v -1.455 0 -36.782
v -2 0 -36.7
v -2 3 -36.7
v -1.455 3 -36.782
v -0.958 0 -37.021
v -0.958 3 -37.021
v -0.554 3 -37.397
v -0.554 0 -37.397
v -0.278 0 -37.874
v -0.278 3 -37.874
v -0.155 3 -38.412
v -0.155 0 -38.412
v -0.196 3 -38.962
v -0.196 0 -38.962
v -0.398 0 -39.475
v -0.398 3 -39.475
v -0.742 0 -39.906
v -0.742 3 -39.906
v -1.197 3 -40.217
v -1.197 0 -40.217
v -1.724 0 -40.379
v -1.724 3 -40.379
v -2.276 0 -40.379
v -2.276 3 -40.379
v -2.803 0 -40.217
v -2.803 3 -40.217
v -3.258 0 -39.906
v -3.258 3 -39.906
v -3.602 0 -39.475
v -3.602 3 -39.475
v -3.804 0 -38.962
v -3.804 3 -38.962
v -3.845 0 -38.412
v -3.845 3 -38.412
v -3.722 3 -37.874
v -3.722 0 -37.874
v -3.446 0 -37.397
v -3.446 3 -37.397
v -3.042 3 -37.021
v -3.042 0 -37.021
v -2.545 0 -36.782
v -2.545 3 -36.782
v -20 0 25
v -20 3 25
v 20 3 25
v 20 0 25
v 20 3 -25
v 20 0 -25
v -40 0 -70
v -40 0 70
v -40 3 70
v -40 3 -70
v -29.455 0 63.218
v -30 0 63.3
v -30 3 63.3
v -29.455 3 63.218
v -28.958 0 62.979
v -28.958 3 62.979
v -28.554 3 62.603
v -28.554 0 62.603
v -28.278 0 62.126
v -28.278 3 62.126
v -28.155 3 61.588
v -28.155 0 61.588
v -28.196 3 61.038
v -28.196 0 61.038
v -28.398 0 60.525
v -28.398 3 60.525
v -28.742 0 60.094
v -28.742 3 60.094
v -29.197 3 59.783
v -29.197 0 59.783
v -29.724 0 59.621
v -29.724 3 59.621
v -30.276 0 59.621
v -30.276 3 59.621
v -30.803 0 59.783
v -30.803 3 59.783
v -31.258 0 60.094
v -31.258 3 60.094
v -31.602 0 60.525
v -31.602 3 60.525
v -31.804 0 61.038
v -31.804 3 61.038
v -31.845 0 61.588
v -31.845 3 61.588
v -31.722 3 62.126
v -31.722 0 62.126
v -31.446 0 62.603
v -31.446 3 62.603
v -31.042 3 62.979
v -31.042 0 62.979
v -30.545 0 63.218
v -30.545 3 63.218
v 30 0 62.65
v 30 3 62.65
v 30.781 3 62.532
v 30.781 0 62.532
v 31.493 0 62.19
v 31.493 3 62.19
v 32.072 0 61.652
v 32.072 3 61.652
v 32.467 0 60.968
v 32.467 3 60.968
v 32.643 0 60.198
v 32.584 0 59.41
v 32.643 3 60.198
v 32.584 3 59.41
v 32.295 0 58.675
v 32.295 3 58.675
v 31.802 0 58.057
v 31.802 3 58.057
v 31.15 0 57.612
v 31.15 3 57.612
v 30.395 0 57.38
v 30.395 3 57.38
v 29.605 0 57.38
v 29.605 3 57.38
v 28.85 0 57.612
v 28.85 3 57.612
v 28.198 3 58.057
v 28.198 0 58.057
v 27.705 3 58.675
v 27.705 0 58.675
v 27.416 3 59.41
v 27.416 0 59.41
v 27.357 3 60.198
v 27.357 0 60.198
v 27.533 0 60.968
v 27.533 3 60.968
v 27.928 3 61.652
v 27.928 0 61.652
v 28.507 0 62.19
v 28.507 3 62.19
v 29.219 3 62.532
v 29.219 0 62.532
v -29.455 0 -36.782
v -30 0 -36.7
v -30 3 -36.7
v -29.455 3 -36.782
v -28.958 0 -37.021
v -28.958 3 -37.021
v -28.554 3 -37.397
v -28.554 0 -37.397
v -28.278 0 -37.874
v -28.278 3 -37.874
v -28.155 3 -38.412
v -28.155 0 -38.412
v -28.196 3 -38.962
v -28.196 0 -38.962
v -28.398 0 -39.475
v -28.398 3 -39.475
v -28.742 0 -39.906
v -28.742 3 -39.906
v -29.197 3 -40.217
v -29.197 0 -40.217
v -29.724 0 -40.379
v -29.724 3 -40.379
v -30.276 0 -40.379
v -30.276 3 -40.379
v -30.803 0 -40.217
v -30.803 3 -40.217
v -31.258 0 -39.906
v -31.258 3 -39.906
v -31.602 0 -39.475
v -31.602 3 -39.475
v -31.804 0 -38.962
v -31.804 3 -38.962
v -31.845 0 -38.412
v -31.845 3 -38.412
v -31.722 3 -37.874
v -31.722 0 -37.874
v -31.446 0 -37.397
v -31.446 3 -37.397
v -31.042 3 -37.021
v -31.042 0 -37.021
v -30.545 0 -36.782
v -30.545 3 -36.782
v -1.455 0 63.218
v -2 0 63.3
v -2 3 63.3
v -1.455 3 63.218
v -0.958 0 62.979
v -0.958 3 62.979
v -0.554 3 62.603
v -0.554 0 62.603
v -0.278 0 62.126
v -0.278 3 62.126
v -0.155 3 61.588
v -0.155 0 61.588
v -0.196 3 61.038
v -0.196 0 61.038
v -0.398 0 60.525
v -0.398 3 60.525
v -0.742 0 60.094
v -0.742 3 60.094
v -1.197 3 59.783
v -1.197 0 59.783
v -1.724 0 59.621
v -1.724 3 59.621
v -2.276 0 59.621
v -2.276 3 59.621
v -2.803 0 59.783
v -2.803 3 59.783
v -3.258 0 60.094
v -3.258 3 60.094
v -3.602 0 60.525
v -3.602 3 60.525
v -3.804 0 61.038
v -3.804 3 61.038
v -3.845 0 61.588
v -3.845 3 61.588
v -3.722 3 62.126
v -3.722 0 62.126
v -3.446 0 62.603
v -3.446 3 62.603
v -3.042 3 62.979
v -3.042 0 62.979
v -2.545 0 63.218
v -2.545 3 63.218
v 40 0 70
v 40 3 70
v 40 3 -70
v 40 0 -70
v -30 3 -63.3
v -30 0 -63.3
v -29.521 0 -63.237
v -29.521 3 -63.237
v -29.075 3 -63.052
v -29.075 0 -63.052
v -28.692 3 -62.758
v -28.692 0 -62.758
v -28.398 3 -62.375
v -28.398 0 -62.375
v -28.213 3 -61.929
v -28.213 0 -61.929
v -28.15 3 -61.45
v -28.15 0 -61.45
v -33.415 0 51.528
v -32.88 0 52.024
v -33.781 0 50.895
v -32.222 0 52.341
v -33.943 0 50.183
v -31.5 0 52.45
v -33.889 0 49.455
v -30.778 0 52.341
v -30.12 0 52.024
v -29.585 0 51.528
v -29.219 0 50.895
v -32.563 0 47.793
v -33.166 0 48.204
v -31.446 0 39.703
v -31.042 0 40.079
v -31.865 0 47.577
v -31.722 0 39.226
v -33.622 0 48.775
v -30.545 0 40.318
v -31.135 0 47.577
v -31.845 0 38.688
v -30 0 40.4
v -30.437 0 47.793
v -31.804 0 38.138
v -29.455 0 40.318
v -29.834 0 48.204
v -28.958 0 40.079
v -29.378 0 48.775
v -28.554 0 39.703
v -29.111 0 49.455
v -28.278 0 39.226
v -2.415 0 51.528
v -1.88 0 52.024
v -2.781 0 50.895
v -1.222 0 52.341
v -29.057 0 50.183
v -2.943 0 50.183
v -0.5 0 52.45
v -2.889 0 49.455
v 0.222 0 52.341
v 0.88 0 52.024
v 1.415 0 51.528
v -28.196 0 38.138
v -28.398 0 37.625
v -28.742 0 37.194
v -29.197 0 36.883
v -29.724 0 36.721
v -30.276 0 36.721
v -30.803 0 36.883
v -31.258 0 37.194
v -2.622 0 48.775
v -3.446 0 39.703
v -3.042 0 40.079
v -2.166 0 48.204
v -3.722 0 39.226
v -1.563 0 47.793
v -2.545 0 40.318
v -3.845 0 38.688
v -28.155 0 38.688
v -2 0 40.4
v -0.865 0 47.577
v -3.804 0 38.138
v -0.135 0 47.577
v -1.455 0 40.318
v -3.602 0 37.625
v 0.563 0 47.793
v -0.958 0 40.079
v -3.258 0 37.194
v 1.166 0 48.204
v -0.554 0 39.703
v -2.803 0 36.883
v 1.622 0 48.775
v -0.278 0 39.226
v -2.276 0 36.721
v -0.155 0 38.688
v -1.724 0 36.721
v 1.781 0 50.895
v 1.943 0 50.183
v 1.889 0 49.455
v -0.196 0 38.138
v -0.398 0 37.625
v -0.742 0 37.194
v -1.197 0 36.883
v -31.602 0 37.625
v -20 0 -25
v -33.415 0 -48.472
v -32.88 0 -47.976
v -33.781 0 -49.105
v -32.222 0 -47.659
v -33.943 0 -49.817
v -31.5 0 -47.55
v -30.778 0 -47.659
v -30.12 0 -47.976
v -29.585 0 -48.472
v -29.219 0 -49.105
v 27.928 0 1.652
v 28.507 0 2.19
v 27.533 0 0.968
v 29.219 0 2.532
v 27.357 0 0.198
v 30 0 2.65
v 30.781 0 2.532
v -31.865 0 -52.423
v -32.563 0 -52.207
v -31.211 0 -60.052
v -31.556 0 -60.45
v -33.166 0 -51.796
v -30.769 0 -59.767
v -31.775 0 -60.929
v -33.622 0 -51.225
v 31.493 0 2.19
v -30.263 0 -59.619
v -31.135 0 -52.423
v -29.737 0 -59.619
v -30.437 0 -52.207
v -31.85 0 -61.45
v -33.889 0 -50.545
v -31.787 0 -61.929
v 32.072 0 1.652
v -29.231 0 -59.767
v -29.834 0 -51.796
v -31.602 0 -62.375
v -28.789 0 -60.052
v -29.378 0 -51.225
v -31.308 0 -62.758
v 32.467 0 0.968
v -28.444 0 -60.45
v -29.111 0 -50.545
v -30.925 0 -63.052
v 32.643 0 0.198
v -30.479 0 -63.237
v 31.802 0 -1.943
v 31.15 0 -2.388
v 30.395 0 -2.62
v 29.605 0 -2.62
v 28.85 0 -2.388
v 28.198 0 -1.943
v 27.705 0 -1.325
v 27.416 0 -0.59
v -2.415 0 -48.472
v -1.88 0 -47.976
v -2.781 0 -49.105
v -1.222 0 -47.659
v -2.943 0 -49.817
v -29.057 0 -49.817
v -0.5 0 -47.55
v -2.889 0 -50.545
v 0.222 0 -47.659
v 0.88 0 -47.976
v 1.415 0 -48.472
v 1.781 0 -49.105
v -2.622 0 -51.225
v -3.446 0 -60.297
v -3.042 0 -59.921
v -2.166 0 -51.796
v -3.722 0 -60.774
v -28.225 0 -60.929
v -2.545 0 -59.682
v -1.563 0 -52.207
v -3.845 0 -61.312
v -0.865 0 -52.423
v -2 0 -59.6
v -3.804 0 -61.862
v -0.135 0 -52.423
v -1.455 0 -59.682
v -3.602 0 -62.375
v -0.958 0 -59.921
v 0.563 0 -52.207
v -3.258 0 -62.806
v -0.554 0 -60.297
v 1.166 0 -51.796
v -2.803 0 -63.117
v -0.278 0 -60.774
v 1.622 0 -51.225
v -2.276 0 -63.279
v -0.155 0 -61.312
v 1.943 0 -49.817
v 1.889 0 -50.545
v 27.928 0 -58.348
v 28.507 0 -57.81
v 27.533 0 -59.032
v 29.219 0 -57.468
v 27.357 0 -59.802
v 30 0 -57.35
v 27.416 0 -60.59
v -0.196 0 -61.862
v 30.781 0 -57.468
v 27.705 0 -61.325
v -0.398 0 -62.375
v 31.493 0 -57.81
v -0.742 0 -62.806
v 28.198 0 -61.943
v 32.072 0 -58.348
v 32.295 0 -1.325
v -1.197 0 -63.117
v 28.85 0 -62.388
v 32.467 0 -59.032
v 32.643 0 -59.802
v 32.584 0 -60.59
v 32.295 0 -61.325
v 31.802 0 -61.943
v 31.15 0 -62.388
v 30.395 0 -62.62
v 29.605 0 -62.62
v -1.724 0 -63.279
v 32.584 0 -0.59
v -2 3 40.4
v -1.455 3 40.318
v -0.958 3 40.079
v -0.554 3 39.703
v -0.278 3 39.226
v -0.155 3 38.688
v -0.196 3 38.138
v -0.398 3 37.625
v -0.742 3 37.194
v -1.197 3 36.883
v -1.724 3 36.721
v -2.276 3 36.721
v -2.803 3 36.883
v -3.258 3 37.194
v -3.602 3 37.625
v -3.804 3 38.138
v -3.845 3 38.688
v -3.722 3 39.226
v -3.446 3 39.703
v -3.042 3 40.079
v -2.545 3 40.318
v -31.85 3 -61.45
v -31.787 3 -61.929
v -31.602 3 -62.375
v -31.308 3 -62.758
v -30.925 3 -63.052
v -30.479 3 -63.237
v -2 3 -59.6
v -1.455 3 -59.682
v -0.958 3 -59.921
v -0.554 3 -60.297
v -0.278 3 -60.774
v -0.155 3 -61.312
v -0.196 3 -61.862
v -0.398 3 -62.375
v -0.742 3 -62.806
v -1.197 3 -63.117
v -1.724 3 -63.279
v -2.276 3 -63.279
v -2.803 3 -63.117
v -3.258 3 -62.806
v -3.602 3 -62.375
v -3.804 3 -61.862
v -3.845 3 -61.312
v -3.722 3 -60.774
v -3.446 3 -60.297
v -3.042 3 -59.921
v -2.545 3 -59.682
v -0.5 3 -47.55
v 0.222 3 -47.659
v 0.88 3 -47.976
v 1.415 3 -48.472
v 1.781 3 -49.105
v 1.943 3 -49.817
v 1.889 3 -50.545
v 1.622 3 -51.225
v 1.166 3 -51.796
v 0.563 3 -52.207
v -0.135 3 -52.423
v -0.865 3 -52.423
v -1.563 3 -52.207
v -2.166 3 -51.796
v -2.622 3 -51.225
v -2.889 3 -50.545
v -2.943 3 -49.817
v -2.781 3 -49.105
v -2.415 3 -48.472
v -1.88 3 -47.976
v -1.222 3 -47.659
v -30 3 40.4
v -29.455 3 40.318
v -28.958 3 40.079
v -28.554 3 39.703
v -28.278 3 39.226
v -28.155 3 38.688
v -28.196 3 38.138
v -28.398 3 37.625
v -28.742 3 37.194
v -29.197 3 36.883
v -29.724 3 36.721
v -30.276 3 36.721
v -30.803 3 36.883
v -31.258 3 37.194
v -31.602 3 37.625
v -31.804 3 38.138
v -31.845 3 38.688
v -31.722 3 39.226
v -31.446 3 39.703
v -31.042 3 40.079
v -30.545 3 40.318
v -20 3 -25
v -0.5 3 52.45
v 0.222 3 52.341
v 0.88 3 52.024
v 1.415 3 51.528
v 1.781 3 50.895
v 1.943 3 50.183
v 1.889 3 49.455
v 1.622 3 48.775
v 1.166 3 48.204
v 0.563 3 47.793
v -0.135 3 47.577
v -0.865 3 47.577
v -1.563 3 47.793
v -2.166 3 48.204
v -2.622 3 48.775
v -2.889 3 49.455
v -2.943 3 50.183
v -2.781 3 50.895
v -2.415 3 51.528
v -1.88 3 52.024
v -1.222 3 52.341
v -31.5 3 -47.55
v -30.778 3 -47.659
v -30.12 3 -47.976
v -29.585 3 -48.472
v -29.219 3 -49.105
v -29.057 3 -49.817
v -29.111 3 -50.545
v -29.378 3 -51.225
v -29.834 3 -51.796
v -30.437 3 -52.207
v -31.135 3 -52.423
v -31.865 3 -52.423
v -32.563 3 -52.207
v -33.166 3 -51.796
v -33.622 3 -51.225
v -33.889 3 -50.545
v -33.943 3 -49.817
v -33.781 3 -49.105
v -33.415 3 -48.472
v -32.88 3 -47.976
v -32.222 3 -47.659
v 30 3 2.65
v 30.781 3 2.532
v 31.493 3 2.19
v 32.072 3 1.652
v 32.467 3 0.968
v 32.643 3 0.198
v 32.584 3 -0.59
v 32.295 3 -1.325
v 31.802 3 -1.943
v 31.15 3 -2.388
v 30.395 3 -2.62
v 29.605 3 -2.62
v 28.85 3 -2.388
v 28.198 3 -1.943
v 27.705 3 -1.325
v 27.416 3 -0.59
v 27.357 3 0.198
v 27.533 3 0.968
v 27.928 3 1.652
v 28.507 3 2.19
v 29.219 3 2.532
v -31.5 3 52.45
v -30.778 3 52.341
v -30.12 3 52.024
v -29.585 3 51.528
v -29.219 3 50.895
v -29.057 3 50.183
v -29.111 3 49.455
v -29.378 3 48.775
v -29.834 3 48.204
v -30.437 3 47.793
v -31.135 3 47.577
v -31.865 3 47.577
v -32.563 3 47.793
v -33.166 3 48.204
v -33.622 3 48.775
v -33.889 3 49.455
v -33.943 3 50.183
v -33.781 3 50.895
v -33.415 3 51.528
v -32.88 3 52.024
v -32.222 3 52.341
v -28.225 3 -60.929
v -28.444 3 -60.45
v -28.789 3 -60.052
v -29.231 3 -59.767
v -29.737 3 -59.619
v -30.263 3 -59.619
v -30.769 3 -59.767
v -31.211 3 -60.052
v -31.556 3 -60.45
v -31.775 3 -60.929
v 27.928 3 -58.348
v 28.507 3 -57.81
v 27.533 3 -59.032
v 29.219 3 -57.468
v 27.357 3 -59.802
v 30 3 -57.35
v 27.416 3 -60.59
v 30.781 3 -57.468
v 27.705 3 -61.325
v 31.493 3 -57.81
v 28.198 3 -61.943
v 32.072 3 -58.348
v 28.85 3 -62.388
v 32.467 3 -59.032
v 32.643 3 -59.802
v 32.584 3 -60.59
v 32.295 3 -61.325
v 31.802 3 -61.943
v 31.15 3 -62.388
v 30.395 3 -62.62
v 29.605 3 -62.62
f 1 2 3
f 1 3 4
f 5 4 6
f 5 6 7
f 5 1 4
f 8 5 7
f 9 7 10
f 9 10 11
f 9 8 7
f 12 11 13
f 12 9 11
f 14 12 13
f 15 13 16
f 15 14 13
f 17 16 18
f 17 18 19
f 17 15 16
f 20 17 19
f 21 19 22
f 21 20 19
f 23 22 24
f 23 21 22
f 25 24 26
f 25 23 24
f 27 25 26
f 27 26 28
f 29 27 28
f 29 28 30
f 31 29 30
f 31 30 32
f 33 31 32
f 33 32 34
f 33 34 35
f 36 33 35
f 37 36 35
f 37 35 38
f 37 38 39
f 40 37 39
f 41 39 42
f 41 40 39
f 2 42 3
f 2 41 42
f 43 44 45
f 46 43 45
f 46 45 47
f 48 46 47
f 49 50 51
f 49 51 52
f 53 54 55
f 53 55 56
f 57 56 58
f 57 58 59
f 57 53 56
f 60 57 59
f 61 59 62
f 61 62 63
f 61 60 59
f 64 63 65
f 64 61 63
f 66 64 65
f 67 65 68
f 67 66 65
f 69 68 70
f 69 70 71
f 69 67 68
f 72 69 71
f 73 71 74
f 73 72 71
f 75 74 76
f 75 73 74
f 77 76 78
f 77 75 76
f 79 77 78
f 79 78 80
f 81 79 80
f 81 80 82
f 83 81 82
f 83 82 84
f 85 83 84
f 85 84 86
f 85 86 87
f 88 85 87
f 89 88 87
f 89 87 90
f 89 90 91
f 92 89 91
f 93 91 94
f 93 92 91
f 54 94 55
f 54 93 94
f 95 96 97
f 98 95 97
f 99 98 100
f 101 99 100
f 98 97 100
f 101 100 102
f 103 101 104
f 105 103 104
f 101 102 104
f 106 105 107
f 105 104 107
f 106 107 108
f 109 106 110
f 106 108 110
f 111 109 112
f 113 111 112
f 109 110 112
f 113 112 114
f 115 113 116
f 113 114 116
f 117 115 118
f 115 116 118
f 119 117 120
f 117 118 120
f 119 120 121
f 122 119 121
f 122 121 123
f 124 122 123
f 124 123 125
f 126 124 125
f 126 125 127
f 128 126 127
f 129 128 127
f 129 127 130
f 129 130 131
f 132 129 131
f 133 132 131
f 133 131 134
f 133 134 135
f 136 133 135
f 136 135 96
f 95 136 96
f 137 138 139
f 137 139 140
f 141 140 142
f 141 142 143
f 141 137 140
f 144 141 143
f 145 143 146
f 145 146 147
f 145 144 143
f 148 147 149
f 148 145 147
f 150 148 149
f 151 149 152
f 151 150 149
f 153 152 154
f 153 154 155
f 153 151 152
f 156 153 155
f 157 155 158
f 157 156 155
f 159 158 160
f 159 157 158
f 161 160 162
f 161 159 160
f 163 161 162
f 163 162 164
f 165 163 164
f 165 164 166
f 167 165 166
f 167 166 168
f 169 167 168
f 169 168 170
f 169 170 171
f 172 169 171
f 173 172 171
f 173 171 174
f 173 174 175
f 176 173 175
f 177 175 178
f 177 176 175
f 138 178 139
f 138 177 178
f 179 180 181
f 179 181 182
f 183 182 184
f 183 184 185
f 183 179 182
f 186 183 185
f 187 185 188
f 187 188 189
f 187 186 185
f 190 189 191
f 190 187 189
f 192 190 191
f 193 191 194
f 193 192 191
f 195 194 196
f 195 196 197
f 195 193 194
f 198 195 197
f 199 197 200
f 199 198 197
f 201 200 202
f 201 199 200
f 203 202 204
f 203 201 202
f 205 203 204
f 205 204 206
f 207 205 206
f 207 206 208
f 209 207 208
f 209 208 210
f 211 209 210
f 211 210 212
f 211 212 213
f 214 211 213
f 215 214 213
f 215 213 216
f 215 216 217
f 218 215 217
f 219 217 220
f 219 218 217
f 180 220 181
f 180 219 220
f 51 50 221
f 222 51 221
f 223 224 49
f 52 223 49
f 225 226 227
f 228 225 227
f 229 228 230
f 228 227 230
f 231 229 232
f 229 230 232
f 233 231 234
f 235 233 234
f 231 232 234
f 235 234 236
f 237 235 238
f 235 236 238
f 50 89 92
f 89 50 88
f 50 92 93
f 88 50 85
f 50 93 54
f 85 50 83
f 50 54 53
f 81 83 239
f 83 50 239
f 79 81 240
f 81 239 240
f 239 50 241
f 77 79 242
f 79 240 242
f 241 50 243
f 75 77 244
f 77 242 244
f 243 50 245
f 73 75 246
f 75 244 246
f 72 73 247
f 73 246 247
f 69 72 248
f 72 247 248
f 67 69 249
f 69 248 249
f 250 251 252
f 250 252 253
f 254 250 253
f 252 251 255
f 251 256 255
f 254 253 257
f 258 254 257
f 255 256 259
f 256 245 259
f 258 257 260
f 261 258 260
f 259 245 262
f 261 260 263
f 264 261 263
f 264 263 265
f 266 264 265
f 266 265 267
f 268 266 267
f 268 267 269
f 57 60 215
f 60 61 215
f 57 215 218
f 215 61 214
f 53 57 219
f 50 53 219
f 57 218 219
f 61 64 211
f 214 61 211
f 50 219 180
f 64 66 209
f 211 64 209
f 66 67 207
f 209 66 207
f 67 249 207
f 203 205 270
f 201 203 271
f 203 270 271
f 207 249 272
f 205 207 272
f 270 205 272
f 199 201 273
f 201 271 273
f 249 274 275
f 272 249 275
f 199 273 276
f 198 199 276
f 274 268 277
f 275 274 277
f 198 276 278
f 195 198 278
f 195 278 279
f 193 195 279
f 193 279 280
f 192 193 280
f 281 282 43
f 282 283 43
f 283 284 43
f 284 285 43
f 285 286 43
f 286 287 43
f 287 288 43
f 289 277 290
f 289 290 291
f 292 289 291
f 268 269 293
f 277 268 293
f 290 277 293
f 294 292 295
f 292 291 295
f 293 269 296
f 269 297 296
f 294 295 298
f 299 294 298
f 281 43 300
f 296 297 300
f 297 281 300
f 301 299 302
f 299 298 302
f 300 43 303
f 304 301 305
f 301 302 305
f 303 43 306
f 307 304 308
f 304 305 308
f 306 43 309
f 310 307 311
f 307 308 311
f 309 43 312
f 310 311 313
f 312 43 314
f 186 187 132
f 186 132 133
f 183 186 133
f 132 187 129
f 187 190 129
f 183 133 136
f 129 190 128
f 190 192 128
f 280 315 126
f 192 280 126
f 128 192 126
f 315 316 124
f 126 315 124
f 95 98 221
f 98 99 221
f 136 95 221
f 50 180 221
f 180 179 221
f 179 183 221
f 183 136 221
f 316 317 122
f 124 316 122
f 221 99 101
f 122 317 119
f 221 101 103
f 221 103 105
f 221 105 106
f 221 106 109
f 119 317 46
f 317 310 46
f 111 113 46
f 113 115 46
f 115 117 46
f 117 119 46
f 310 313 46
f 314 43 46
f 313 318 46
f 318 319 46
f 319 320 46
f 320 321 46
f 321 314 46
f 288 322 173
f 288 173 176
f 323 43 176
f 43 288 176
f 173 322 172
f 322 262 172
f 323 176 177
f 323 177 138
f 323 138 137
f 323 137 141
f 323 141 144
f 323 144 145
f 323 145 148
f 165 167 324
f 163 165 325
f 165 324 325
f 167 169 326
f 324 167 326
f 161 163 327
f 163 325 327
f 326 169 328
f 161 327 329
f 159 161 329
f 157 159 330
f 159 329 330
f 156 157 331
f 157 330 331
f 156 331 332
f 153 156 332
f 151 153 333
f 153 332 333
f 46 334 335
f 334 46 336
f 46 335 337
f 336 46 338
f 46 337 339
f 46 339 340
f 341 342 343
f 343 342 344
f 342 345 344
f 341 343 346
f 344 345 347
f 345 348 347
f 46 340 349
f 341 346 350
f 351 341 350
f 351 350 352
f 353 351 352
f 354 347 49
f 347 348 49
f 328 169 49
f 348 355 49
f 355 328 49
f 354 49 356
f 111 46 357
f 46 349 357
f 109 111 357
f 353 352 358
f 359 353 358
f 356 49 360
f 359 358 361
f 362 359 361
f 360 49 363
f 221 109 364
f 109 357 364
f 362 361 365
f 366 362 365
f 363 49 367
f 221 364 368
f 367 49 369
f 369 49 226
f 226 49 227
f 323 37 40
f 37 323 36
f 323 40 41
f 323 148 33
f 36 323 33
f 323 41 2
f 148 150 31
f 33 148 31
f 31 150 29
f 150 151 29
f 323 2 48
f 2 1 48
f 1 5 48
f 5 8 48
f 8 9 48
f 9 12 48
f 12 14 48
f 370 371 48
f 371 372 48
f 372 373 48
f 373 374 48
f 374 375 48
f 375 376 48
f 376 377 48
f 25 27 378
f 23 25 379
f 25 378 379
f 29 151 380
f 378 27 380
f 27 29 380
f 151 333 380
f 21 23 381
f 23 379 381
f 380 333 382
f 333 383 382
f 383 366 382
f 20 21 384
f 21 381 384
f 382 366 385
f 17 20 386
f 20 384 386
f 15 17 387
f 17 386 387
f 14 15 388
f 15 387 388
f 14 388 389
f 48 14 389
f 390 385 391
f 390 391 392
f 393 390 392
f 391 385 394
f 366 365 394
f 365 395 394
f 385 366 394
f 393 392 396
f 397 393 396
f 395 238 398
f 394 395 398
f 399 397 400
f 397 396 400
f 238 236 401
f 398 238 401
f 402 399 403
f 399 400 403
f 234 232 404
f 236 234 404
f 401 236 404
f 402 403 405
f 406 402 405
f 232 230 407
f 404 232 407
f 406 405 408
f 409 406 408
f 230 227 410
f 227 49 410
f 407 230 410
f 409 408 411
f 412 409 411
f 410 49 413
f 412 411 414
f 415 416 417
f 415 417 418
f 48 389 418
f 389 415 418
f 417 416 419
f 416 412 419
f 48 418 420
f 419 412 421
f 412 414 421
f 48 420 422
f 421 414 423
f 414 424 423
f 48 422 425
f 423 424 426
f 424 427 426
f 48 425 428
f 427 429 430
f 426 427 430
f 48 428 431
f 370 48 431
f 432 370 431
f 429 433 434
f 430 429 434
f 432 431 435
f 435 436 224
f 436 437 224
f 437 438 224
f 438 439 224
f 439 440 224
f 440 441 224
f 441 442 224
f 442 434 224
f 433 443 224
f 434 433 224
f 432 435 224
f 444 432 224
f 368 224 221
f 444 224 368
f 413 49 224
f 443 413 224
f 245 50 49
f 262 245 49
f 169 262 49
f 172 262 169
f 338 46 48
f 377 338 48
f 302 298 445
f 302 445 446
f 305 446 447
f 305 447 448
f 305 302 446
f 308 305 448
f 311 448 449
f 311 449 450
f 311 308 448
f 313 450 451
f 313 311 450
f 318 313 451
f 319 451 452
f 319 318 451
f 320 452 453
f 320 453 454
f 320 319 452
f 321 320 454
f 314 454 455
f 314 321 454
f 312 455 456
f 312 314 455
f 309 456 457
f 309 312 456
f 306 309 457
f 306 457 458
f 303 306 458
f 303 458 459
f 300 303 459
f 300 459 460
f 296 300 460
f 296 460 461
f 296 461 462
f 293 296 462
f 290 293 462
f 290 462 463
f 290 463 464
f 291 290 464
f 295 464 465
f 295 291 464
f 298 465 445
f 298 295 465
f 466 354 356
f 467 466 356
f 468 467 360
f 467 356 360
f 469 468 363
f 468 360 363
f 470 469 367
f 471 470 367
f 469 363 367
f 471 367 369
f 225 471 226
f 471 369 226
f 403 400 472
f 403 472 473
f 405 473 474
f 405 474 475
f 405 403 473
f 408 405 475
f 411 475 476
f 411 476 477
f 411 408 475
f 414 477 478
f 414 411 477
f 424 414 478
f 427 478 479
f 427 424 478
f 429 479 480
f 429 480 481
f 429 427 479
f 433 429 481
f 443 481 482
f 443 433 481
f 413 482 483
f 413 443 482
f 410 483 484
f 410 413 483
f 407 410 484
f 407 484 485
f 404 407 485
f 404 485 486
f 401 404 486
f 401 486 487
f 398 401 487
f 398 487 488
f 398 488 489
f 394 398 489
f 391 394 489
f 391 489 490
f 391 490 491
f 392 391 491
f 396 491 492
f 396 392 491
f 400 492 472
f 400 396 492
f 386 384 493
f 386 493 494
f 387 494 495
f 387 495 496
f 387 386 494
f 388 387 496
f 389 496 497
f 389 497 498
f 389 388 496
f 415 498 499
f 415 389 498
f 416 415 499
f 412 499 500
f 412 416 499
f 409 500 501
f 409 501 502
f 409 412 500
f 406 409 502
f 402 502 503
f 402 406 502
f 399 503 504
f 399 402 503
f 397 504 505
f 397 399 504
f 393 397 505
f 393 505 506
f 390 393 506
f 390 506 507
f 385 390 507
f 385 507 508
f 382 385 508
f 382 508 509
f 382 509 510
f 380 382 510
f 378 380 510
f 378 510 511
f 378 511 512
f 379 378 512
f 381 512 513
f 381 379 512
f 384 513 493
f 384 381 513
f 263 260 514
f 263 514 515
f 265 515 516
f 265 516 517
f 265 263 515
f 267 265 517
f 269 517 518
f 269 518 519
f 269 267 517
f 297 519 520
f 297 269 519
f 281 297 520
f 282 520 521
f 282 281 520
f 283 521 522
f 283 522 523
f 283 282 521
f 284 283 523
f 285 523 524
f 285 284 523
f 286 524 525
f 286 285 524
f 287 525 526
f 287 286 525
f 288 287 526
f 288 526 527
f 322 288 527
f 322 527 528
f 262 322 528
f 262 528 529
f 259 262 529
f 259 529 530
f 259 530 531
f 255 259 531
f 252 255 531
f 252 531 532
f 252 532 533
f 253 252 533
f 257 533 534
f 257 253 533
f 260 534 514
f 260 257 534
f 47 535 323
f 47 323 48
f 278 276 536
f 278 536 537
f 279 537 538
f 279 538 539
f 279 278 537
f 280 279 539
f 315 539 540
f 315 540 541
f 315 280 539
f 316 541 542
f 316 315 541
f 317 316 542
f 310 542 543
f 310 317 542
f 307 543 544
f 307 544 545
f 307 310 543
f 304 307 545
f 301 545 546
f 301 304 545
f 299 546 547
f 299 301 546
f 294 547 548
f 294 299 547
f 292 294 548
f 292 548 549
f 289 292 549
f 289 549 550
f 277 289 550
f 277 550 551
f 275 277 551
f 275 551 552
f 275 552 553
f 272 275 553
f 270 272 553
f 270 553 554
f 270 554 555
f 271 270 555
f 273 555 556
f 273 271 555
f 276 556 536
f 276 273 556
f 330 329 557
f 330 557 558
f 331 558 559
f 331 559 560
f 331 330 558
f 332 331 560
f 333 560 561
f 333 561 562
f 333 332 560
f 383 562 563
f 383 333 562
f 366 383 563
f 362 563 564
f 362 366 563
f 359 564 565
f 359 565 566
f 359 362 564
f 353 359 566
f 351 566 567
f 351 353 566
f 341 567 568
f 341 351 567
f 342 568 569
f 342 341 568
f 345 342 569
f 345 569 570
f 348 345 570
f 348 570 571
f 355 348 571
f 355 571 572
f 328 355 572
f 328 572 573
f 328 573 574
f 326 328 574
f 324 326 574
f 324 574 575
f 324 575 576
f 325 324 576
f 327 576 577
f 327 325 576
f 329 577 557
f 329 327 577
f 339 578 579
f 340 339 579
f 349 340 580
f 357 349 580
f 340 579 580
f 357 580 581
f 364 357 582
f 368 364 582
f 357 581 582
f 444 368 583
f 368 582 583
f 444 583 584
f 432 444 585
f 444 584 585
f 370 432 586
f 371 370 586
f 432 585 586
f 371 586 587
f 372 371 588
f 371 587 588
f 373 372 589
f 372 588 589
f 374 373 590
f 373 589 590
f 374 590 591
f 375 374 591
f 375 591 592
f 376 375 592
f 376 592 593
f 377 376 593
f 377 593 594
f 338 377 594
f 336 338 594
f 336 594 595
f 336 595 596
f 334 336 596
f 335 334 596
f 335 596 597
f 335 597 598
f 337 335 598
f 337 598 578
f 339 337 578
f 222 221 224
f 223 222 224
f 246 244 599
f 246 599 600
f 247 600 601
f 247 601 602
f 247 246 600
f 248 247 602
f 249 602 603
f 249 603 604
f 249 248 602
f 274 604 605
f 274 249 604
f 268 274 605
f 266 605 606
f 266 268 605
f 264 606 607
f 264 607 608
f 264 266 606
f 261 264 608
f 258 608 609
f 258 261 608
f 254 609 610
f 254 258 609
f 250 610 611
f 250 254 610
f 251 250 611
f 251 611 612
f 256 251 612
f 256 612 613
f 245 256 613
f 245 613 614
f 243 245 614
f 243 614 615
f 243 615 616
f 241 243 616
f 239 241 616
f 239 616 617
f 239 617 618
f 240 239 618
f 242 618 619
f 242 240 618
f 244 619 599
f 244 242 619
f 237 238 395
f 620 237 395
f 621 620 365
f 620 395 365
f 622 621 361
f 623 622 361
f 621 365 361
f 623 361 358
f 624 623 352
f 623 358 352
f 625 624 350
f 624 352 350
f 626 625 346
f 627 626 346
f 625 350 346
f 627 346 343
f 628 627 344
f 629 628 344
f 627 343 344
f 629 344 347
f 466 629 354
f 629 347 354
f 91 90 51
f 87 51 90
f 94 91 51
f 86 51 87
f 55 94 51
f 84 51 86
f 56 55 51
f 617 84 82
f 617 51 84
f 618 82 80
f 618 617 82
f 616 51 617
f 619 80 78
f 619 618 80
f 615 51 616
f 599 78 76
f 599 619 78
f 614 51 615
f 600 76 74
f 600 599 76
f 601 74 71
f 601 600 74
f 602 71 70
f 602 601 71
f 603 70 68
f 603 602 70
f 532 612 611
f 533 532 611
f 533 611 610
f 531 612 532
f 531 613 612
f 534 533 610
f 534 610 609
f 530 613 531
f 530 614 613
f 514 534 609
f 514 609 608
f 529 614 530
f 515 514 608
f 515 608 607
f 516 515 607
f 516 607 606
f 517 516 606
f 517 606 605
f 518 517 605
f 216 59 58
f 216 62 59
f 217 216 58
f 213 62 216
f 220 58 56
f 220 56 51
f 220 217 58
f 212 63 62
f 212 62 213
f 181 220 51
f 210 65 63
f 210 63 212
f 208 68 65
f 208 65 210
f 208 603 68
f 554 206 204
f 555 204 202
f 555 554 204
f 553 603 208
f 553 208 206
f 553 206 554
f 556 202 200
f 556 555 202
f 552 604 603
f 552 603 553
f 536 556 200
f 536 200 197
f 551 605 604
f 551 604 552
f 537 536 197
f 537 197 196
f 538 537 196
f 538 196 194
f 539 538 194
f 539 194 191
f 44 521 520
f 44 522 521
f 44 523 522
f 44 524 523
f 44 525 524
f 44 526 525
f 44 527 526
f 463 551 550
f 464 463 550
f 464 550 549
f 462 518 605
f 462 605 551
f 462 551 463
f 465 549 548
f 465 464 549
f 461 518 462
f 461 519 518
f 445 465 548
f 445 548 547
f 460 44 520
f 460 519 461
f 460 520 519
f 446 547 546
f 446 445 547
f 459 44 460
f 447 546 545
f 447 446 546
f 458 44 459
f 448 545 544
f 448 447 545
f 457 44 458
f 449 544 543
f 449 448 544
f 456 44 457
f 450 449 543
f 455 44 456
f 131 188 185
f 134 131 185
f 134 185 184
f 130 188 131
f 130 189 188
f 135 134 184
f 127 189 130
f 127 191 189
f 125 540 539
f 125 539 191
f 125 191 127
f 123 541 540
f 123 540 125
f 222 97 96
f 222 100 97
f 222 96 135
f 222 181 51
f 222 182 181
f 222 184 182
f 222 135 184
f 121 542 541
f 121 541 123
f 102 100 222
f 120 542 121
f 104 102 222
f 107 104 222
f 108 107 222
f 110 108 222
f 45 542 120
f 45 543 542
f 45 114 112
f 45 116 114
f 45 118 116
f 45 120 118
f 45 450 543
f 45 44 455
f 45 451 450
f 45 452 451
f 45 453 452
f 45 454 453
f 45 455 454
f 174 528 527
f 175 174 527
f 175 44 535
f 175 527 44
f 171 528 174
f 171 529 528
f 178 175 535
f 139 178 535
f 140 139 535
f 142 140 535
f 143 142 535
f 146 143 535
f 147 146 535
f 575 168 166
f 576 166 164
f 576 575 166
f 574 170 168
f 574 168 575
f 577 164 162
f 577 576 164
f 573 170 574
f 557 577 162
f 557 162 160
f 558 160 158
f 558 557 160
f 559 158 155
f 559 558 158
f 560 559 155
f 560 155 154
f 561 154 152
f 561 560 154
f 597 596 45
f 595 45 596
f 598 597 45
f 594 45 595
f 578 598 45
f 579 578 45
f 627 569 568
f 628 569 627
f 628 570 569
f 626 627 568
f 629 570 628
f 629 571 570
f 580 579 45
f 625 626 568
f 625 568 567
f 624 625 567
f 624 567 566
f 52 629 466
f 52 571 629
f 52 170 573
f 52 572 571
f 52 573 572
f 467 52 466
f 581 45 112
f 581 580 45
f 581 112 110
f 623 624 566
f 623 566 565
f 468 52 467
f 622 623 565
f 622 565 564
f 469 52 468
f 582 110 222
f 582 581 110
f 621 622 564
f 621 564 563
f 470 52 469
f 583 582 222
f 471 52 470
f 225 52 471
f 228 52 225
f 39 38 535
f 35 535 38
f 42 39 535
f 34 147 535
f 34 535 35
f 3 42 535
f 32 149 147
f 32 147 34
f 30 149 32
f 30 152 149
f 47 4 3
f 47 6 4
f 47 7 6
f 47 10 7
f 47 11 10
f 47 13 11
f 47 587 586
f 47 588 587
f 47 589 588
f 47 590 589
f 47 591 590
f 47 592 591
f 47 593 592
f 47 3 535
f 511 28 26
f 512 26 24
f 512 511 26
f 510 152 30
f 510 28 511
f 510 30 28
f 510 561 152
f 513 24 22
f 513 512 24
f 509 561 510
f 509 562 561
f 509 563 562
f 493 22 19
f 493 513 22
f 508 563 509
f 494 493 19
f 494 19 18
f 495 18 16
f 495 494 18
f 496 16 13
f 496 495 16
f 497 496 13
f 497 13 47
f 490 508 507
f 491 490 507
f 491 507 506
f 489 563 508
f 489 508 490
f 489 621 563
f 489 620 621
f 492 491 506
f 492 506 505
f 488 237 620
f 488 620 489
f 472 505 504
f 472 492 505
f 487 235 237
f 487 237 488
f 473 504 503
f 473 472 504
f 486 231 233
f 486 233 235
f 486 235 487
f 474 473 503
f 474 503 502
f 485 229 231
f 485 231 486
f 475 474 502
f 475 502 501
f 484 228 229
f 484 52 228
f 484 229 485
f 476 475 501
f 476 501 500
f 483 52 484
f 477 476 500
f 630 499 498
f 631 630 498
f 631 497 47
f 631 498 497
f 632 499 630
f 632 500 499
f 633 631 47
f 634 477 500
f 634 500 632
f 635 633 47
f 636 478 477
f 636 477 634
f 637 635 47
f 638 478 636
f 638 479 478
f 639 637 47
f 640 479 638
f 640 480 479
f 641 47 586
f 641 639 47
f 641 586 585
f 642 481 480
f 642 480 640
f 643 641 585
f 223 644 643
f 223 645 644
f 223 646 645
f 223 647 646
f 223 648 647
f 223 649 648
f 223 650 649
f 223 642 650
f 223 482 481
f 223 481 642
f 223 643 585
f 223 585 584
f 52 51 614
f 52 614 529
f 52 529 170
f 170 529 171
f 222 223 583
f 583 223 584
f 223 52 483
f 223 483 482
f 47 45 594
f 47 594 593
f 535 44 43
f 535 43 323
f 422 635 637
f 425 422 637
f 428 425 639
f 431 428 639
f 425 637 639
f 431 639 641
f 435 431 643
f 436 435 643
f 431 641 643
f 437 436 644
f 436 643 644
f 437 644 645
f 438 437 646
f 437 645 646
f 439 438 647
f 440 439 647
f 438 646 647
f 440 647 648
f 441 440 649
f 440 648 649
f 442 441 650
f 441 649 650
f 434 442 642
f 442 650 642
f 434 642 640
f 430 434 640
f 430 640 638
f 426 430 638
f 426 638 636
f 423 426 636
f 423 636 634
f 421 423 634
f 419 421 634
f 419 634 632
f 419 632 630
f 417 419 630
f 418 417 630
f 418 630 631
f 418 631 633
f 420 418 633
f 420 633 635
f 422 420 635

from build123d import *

# Parameters (mm, degrees)
SKETCH_1_R          = 2.5
SKETCH_1_R_2        = 2.45
SKETCH_1_R_3        = 1.85
SKETCH_1_W          = 48
SKETCH_1_H          = 40
EXTRUDE_1_DEPTH     = 3
CUT_EXTRUDE_1_REACH = 82.678
SKETCH_2_W          = 40
SKETCH_2_H          = 50
SKETCH_3_R          = 2.65
CUT_EXTRUDE_2_DEPTH = 10


with BuildPart() as part:
    # 草图1 → 凸台-拉伸1 (new body)
    # profile 1 of 5: a face of its own
    with BuildSketch(Plane(origin=(0, 0, 0), x_dir=(1, 0, 0), z_dir=(0, 1, 0))):
        with BuildLine():
            Line((8, -30), (8, -70))
            Line((8, -70), (40, -70))
            Line((40, -70), (40, 60))
            Line((40, 60), (32.5, 60))
            ThreePointArc((32.5, 60), (28.232233047, 58.232233047), (30, 62.5))
            Line((30, 62.5), (30, 70))
            Line((30, 70), (8, 70))
            Line((8, 70), (8, 30))
            Line((8, 30), (-40, 30))
            Line((-40, 30), (-40, -30))
            Line((-40, -30), (8, -30))
        make_face()
        with Locations(Location((30, -60, 0), (0, 0, 270))):
            Circle(SKETCH_1_R, mode=Mode.SUBTRACT)
        with Locations(Location((30, 0, 0), (0, 0, 270))):
            Circle(SKETCH_1_R, mode=Mode.SUBTRACT)
    # profile 2 of 5: a face of its own
    with BuildSketch(Plane(origin=(0, 0, 0), x_dir=(1, 0, 0), z_dir=(0, 1, 0))):
        with BuildLine():
            Line((32.5, 60), (40, 60))
            Line((40, 60), (40, 70))
            Line((40, 70), (30, 70))
            Line((30, 70), (30, 62.5))
            ThreePointArc((30, 62.5), (31.767766953, 61.767766953), (32.5, 60))
        make_face()
    # profile 3 of 5: a face of its own
    with BuildSketch(Plane(origin=(0, 0, 0), x_dir=(1, 0, 0), z_dir=(0, 1, 0))):
        with BuildLine():
            Line((-40, 61.45), (-40, 30))
            Line((-40, 30), (8, 30))
            Line((8, 30), (8, 70))
            Line((8, 70), (-30, 70))
            Line((-30, 70), (-30, 63.3))
            ThreePointArc((-30, 63.3), (-28.691852455, 62.758147545), (-28.15, 61.45))
            ThreePointArc((-28.15, 61.45), (-30, 59.6), (-31.85, 61.45))
            Line((-31.85, 61.45), (-40, 61.45))
        make_face()
        with Locations(Location((-31.5, 50, 0), (0, 0, 270))):
            Circle(SKETCH_1_R_2, mode=Mode.SUBTRACT)
        with Locations(Location((-30, 38.55, 0), (0, 0, 270))):
            Circle(SKETCH_1_R_3, mode=Mode.SUBTRACT)
        with Locations(Location((-2, 38.55, 0), (0, 0, 270))):
            Circle(SKETCH_1_R_3, mode=Mode.SUBTRACT)
        with Locations(Location((-0.5, 50, 0), (0, 0, 270))):
            Circle(SKETCH_1_R_2, mode=Mode.SUBTRACT)
        with Locations(Location((-2, 61.45, 0), (0, 0, 270))):
            Circle(SKETCH_1_R_3, mode=Mode.SUBTRACT)
    # profile 4 of 5: a face of its own
    with BuildSketch(Plane(origin=(0, 0, 0), x_dir=(1, 0, 0), z_dir=(0, 1, 0))):
        with BuildLine():
            Line((-40, 70), (-40, 61.45))
            Line((-40, 61.45), (-31.85, 61.45))
            ThreePointArc((-31.85, 61.45), (-31.308147545, 62.758147545), (-30, 63.3))
            Line((-30, 63.3), (-30, 70))
            Line((-30, 70), (-40, 70))
        make_face()
    # profile 5 of 5: a face of its own
    with BuildSketch(Plane(origin=(0, 0, 0), x_dir=(1, 0, 0), z_dir=(0, 1, 0))):
        with Locations((-16, -50)):
            Rectangle(SKETCH_1_W, SKETCH_1_H)
        with Locations(Location((-30, -61.45, 0), (0, 0, 270))):
            Circle(SKETCH_1_R_3, mode=Mode.SUBTRACT)
        with Locations(Location((-31.5, -50, 0), (0, 0, 270))):
            Circle(SKETCH_1_R_2, mode=Mode.SUBTRACT)
        with Locations(Location((-30, -38.55, 0), (0, 0, 270))):
            Circle(SKETCH_1_R_3, mode=Mode.SUBTRACT)
        with Locations(Location((-2, -61.45, 0), (0, 0, 270))):
            Circle(SKETCH_1_R_3, mode=Mode.SUBTRACT)
        with Locations(Location((-0.5, -50, 0), (0, 0, 270))):
            Circle(SKETCH_1_R_2, mode=Mode.SUBTRACT)
        with Locations(Location((-2, -38.55, 0), (0, 0, 270))):
            Circle(SKETCH_1_R_3, mode=Mode.SUBTRACT)
    extrude(amount=EXTRUDE_1_DEPTH)

    # 草图2 → 切除-拉伸1 (cut, up to next)
    with BuildSketch(Plane(origin=(0, 3, 0), x_dir=(1, 0, 0), z_dir=(0, 1, 0)), mode=Mode.PRIVATE) as cut_extrude_1_sk1:
        Rectangle(SKETCH_2_W, SKETCH_2_H)
    cut_extrude_1_tool1 = extrude(cut_extrude_1_sk1.sketch, amount=-CUT_EXTRUDE_1_REACH, mode=Mode.PRIVATE) & part.part
    add(cut_extrude_1_tool1.solids().sort_by_distance((0, 3, 0))[0], mode=Mode.SUBTRACT)

    # 草图3 → 切除-拉伸2 (cut)
    with BuildSketch(Plane(origin=(0, 3, 0), x_dir=(1, 0, 0), z_dir=(0, 1, 0))):
        with Locations(Location((30, 60, 0), (0, 0, 270))):
            Circle(SKETCH_3_R)
        with Locations(Location((30, 0, 0), (0, 0, 270))):
            Circle(SKETCH_3_R)
        with Locations(Location((30, -60, 0), (0, 0, 270))):
            Circle(SKETCH_3_R)
    extrude(amount=-CUT_EXTRUDE_2_DEPTH, mode=Mode.SUBTRACT)


solid = part.part
